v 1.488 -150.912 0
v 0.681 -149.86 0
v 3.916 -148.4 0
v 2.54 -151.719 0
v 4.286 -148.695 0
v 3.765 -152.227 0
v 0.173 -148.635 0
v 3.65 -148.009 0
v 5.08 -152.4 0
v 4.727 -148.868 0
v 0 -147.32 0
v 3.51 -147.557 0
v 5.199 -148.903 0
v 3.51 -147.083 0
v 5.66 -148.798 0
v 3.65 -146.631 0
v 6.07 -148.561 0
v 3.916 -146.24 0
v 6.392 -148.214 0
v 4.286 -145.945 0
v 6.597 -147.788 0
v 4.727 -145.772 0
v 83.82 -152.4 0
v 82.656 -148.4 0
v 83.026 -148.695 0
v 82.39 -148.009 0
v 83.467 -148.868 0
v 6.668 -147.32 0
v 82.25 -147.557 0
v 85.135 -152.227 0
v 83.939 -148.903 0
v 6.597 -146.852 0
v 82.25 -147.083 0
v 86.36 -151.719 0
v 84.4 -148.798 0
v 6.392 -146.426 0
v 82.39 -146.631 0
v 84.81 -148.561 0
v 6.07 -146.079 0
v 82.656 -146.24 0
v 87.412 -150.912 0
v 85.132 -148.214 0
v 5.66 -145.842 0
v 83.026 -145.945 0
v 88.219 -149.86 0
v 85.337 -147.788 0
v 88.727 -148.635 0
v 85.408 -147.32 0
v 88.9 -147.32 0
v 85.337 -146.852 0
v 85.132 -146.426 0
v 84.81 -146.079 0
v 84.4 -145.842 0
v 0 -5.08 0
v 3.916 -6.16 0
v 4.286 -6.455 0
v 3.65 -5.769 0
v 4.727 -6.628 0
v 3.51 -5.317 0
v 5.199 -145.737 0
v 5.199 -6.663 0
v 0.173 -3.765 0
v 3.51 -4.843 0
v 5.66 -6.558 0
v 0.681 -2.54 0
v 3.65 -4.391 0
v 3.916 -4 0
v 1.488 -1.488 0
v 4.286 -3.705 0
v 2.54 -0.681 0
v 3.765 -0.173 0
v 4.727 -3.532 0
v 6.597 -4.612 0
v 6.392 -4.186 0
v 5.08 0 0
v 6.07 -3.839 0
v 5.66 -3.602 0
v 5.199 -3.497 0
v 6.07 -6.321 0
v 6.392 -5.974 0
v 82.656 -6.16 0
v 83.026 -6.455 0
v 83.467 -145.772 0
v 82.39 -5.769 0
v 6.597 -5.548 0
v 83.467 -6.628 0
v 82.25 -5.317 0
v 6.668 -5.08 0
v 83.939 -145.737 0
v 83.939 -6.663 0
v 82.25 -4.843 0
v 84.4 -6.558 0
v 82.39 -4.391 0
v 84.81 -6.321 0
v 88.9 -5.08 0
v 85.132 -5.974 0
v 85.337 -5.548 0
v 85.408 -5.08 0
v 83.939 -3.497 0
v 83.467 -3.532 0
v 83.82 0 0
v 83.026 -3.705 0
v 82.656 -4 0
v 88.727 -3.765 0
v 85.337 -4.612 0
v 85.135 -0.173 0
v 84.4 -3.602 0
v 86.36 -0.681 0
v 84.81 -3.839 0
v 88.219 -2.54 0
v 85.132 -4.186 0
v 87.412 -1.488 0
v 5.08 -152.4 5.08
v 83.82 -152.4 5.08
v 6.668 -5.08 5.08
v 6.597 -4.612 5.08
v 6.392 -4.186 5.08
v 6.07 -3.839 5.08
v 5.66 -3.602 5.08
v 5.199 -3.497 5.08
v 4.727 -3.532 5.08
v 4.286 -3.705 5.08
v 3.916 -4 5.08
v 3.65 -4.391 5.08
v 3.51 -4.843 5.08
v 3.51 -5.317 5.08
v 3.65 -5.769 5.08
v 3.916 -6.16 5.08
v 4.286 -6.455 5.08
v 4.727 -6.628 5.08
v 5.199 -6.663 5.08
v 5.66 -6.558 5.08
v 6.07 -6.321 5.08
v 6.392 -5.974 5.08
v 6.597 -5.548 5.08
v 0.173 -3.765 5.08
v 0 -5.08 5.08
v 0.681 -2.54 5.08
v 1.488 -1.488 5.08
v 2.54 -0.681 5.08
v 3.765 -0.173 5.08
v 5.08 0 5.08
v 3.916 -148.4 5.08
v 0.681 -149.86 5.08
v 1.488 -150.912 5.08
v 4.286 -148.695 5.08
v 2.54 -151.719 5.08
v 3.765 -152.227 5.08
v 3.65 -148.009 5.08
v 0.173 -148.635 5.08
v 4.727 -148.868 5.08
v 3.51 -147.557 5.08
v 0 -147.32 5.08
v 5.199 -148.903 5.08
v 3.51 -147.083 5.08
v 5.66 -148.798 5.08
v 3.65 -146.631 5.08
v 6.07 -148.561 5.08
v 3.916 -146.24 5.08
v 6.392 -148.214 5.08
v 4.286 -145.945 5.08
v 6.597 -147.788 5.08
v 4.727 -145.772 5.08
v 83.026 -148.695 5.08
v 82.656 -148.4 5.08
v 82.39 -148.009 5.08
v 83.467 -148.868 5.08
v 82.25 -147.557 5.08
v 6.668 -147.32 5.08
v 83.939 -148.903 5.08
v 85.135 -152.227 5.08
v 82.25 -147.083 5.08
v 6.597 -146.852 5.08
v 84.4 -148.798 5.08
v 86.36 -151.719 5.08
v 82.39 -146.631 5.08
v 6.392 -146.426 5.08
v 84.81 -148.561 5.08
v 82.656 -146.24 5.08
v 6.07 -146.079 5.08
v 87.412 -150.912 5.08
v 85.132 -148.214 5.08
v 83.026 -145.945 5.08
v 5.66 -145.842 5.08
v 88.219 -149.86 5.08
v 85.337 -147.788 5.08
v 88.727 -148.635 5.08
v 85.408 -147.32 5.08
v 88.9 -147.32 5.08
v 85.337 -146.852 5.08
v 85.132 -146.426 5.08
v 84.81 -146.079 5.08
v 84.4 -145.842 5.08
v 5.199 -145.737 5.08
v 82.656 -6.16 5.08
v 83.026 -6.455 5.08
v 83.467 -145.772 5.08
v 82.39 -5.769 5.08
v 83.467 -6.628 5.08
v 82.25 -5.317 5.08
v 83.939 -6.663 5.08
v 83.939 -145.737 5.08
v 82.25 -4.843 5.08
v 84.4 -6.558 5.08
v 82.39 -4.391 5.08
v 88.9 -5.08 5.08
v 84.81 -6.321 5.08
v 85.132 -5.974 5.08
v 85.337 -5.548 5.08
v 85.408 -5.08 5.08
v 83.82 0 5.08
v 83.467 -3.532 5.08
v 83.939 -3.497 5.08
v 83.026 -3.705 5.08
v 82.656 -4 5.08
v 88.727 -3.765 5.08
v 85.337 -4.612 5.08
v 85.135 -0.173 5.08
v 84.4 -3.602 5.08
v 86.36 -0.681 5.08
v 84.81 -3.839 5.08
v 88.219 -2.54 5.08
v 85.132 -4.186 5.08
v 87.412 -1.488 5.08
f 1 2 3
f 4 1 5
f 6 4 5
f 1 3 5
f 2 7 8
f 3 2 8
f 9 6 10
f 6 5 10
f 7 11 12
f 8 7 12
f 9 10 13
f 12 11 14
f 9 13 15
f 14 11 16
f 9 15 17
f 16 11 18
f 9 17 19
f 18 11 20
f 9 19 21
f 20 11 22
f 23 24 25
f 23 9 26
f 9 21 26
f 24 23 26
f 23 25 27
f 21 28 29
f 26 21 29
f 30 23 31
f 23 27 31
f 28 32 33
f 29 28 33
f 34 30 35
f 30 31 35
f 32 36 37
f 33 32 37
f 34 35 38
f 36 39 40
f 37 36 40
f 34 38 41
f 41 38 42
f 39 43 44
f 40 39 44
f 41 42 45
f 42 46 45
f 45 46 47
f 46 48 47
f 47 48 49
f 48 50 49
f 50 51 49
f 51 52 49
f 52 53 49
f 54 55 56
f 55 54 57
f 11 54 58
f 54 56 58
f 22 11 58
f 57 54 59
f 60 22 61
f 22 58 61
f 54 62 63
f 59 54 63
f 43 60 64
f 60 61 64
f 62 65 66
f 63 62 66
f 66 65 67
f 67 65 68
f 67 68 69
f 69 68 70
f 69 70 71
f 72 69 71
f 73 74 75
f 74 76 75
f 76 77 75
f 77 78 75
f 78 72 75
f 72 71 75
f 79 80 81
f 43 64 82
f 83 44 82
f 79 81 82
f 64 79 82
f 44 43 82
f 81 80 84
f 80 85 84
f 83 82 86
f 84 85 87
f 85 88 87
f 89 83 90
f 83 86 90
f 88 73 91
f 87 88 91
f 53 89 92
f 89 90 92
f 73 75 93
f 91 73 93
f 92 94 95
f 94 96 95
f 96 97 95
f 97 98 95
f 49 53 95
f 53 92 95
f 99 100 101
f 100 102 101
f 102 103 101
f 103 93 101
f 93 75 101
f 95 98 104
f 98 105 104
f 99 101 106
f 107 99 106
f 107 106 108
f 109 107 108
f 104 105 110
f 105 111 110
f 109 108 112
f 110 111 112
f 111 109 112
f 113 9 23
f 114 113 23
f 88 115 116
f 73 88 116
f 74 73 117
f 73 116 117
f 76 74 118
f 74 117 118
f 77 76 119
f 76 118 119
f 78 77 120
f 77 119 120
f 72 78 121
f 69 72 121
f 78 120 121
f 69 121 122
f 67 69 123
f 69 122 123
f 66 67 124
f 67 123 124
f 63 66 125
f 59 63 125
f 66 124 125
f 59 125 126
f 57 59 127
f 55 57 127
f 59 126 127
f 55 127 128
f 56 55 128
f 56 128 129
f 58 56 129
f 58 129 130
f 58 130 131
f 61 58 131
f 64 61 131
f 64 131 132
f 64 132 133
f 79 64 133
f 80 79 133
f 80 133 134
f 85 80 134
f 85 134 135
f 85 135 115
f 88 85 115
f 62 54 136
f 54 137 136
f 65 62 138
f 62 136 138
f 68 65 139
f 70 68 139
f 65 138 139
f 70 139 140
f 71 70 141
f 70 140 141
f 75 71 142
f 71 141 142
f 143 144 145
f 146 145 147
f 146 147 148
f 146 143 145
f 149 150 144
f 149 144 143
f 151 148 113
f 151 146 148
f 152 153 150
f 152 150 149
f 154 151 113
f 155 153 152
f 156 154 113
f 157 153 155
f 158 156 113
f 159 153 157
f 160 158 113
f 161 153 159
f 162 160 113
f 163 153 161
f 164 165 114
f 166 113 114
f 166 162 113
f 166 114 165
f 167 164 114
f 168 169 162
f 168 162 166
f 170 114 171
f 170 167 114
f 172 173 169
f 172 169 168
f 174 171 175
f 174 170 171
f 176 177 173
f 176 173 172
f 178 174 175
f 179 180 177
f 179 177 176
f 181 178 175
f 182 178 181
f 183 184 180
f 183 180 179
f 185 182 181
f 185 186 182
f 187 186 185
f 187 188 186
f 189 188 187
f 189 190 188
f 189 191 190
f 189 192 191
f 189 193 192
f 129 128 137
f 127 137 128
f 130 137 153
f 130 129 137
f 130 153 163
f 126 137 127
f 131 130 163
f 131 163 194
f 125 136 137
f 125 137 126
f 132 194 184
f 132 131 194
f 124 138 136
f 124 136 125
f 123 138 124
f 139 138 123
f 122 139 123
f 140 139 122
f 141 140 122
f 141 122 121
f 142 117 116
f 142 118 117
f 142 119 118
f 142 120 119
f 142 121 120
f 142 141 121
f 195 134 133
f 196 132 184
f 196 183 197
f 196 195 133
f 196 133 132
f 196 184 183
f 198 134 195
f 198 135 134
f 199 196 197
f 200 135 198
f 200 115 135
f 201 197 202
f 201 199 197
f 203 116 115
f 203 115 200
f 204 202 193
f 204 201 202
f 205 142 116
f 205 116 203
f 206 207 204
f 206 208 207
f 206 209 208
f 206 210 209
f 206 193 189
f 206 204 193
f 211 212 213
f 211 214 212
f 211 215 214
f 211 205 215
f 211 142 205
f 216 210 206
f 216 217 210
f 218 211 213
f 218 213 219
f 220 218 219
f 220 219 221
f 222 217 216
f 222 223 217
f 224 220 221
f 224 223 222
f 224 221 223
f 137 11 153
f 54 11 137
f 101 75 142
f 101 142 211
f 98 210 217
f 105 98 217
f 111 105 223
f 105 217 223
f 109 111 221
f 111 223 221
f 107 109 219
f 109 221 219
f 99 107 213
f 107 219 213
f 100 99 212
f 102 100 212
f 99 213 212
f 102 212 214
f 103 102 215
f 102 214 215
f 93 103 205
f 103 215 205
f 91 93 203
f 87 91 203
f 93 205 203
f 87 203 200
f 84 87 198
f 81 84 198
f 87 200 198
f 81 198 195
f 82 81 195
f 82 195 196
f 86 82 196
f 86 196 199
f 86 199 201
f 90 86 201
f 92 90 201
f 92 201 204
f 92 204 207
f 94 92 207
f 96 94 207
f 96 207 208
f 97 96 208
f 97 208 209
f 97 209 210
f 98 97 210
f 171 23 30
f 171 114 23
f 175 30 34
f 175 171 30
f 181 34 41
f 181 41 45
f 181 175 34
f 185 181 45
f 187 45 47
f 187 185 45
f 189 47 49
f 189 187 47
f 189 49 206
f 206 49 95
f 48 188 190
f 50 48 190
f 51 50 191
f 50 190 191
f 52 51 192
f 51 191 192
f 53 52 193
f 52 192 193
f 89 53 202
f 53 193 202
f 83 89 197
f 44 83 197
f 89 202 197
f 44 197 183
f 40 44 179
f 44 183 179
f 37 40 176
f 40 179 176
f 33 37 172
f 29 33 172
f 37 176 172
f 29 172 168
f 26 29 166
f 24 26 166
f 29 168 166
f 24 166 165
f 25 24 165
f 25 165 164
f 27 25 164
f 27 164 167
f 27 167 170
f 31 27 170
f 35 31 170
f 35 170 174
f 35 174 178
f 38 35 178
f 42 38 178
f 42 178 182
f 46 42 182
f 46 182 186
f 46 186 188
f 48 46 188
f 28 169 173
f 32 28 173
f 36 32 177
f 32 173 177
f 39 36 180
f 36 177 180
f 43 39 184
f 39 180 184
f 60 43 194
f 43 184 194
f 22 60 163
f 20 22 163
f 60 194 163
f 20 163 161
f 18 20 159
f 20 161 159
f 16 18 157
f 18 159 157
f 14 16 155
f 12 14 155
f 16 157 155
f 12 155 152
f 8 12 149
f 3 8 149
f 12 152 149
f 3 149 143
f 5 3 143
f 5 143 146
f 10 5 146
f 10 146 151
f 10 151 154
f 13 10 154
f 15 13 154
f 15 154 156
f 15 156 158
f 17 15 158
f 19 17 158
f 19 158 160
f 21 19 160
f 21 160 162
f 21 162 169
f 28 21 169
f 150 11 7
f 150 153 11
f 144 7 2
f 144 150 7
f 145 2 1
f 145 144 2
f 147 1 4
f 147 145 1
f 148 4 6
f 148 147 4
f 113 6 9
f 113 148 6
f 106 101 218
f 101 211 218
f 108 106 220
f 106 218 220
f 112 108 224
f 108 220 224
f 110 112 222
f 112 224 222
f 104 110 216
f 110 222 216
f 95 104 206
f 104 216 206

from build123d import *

# Parameters (mm, degrees)
F0_W     = 88.9
F0_H     = 152.4
F1_DEPTH = 5.08
F2_R     = 1.5875
F3_DEPTH = 25.4
F4_R     = 5.08


with BuildPart() as f1:
    # F0 (on Top) → F1 (new body)
    with BuildSketch(Plane.XY):
        with Locations((44.45, -76.2)):
            Rectangle(F0_W, F0_H)
    extrude(amount=F1_DEPTH)

    # F2 (on face) → F3 (cut)
    with BuildSketch(Plane.XY.offset(5.08)):
        with Locations((5.08, -5.08)):
            Circle(F2_R)
        with Locations((83.82, -5.08)):
            Circle(F2_R)
        with Locations((83.82, -147.32)):
            Circle(F2_R)
        with Locations((5.08, -147.32)):
            Circle(F2_R)
    extrude(amount=-F3_DEPTH, mode=Mode.SUBTRACT)

    # F4
    f4_edges = [f1.edges().sort_by_distance(p)[0] for p in [
        (0, -152.4, 2.54),
        (88.9, -152.4, 2.54),
        (88.9, 0, 2.54),
        (0, 0, 2.54),
    ]]
    fillet(f4_edges, radius=F4_R)


solid = f1.part
